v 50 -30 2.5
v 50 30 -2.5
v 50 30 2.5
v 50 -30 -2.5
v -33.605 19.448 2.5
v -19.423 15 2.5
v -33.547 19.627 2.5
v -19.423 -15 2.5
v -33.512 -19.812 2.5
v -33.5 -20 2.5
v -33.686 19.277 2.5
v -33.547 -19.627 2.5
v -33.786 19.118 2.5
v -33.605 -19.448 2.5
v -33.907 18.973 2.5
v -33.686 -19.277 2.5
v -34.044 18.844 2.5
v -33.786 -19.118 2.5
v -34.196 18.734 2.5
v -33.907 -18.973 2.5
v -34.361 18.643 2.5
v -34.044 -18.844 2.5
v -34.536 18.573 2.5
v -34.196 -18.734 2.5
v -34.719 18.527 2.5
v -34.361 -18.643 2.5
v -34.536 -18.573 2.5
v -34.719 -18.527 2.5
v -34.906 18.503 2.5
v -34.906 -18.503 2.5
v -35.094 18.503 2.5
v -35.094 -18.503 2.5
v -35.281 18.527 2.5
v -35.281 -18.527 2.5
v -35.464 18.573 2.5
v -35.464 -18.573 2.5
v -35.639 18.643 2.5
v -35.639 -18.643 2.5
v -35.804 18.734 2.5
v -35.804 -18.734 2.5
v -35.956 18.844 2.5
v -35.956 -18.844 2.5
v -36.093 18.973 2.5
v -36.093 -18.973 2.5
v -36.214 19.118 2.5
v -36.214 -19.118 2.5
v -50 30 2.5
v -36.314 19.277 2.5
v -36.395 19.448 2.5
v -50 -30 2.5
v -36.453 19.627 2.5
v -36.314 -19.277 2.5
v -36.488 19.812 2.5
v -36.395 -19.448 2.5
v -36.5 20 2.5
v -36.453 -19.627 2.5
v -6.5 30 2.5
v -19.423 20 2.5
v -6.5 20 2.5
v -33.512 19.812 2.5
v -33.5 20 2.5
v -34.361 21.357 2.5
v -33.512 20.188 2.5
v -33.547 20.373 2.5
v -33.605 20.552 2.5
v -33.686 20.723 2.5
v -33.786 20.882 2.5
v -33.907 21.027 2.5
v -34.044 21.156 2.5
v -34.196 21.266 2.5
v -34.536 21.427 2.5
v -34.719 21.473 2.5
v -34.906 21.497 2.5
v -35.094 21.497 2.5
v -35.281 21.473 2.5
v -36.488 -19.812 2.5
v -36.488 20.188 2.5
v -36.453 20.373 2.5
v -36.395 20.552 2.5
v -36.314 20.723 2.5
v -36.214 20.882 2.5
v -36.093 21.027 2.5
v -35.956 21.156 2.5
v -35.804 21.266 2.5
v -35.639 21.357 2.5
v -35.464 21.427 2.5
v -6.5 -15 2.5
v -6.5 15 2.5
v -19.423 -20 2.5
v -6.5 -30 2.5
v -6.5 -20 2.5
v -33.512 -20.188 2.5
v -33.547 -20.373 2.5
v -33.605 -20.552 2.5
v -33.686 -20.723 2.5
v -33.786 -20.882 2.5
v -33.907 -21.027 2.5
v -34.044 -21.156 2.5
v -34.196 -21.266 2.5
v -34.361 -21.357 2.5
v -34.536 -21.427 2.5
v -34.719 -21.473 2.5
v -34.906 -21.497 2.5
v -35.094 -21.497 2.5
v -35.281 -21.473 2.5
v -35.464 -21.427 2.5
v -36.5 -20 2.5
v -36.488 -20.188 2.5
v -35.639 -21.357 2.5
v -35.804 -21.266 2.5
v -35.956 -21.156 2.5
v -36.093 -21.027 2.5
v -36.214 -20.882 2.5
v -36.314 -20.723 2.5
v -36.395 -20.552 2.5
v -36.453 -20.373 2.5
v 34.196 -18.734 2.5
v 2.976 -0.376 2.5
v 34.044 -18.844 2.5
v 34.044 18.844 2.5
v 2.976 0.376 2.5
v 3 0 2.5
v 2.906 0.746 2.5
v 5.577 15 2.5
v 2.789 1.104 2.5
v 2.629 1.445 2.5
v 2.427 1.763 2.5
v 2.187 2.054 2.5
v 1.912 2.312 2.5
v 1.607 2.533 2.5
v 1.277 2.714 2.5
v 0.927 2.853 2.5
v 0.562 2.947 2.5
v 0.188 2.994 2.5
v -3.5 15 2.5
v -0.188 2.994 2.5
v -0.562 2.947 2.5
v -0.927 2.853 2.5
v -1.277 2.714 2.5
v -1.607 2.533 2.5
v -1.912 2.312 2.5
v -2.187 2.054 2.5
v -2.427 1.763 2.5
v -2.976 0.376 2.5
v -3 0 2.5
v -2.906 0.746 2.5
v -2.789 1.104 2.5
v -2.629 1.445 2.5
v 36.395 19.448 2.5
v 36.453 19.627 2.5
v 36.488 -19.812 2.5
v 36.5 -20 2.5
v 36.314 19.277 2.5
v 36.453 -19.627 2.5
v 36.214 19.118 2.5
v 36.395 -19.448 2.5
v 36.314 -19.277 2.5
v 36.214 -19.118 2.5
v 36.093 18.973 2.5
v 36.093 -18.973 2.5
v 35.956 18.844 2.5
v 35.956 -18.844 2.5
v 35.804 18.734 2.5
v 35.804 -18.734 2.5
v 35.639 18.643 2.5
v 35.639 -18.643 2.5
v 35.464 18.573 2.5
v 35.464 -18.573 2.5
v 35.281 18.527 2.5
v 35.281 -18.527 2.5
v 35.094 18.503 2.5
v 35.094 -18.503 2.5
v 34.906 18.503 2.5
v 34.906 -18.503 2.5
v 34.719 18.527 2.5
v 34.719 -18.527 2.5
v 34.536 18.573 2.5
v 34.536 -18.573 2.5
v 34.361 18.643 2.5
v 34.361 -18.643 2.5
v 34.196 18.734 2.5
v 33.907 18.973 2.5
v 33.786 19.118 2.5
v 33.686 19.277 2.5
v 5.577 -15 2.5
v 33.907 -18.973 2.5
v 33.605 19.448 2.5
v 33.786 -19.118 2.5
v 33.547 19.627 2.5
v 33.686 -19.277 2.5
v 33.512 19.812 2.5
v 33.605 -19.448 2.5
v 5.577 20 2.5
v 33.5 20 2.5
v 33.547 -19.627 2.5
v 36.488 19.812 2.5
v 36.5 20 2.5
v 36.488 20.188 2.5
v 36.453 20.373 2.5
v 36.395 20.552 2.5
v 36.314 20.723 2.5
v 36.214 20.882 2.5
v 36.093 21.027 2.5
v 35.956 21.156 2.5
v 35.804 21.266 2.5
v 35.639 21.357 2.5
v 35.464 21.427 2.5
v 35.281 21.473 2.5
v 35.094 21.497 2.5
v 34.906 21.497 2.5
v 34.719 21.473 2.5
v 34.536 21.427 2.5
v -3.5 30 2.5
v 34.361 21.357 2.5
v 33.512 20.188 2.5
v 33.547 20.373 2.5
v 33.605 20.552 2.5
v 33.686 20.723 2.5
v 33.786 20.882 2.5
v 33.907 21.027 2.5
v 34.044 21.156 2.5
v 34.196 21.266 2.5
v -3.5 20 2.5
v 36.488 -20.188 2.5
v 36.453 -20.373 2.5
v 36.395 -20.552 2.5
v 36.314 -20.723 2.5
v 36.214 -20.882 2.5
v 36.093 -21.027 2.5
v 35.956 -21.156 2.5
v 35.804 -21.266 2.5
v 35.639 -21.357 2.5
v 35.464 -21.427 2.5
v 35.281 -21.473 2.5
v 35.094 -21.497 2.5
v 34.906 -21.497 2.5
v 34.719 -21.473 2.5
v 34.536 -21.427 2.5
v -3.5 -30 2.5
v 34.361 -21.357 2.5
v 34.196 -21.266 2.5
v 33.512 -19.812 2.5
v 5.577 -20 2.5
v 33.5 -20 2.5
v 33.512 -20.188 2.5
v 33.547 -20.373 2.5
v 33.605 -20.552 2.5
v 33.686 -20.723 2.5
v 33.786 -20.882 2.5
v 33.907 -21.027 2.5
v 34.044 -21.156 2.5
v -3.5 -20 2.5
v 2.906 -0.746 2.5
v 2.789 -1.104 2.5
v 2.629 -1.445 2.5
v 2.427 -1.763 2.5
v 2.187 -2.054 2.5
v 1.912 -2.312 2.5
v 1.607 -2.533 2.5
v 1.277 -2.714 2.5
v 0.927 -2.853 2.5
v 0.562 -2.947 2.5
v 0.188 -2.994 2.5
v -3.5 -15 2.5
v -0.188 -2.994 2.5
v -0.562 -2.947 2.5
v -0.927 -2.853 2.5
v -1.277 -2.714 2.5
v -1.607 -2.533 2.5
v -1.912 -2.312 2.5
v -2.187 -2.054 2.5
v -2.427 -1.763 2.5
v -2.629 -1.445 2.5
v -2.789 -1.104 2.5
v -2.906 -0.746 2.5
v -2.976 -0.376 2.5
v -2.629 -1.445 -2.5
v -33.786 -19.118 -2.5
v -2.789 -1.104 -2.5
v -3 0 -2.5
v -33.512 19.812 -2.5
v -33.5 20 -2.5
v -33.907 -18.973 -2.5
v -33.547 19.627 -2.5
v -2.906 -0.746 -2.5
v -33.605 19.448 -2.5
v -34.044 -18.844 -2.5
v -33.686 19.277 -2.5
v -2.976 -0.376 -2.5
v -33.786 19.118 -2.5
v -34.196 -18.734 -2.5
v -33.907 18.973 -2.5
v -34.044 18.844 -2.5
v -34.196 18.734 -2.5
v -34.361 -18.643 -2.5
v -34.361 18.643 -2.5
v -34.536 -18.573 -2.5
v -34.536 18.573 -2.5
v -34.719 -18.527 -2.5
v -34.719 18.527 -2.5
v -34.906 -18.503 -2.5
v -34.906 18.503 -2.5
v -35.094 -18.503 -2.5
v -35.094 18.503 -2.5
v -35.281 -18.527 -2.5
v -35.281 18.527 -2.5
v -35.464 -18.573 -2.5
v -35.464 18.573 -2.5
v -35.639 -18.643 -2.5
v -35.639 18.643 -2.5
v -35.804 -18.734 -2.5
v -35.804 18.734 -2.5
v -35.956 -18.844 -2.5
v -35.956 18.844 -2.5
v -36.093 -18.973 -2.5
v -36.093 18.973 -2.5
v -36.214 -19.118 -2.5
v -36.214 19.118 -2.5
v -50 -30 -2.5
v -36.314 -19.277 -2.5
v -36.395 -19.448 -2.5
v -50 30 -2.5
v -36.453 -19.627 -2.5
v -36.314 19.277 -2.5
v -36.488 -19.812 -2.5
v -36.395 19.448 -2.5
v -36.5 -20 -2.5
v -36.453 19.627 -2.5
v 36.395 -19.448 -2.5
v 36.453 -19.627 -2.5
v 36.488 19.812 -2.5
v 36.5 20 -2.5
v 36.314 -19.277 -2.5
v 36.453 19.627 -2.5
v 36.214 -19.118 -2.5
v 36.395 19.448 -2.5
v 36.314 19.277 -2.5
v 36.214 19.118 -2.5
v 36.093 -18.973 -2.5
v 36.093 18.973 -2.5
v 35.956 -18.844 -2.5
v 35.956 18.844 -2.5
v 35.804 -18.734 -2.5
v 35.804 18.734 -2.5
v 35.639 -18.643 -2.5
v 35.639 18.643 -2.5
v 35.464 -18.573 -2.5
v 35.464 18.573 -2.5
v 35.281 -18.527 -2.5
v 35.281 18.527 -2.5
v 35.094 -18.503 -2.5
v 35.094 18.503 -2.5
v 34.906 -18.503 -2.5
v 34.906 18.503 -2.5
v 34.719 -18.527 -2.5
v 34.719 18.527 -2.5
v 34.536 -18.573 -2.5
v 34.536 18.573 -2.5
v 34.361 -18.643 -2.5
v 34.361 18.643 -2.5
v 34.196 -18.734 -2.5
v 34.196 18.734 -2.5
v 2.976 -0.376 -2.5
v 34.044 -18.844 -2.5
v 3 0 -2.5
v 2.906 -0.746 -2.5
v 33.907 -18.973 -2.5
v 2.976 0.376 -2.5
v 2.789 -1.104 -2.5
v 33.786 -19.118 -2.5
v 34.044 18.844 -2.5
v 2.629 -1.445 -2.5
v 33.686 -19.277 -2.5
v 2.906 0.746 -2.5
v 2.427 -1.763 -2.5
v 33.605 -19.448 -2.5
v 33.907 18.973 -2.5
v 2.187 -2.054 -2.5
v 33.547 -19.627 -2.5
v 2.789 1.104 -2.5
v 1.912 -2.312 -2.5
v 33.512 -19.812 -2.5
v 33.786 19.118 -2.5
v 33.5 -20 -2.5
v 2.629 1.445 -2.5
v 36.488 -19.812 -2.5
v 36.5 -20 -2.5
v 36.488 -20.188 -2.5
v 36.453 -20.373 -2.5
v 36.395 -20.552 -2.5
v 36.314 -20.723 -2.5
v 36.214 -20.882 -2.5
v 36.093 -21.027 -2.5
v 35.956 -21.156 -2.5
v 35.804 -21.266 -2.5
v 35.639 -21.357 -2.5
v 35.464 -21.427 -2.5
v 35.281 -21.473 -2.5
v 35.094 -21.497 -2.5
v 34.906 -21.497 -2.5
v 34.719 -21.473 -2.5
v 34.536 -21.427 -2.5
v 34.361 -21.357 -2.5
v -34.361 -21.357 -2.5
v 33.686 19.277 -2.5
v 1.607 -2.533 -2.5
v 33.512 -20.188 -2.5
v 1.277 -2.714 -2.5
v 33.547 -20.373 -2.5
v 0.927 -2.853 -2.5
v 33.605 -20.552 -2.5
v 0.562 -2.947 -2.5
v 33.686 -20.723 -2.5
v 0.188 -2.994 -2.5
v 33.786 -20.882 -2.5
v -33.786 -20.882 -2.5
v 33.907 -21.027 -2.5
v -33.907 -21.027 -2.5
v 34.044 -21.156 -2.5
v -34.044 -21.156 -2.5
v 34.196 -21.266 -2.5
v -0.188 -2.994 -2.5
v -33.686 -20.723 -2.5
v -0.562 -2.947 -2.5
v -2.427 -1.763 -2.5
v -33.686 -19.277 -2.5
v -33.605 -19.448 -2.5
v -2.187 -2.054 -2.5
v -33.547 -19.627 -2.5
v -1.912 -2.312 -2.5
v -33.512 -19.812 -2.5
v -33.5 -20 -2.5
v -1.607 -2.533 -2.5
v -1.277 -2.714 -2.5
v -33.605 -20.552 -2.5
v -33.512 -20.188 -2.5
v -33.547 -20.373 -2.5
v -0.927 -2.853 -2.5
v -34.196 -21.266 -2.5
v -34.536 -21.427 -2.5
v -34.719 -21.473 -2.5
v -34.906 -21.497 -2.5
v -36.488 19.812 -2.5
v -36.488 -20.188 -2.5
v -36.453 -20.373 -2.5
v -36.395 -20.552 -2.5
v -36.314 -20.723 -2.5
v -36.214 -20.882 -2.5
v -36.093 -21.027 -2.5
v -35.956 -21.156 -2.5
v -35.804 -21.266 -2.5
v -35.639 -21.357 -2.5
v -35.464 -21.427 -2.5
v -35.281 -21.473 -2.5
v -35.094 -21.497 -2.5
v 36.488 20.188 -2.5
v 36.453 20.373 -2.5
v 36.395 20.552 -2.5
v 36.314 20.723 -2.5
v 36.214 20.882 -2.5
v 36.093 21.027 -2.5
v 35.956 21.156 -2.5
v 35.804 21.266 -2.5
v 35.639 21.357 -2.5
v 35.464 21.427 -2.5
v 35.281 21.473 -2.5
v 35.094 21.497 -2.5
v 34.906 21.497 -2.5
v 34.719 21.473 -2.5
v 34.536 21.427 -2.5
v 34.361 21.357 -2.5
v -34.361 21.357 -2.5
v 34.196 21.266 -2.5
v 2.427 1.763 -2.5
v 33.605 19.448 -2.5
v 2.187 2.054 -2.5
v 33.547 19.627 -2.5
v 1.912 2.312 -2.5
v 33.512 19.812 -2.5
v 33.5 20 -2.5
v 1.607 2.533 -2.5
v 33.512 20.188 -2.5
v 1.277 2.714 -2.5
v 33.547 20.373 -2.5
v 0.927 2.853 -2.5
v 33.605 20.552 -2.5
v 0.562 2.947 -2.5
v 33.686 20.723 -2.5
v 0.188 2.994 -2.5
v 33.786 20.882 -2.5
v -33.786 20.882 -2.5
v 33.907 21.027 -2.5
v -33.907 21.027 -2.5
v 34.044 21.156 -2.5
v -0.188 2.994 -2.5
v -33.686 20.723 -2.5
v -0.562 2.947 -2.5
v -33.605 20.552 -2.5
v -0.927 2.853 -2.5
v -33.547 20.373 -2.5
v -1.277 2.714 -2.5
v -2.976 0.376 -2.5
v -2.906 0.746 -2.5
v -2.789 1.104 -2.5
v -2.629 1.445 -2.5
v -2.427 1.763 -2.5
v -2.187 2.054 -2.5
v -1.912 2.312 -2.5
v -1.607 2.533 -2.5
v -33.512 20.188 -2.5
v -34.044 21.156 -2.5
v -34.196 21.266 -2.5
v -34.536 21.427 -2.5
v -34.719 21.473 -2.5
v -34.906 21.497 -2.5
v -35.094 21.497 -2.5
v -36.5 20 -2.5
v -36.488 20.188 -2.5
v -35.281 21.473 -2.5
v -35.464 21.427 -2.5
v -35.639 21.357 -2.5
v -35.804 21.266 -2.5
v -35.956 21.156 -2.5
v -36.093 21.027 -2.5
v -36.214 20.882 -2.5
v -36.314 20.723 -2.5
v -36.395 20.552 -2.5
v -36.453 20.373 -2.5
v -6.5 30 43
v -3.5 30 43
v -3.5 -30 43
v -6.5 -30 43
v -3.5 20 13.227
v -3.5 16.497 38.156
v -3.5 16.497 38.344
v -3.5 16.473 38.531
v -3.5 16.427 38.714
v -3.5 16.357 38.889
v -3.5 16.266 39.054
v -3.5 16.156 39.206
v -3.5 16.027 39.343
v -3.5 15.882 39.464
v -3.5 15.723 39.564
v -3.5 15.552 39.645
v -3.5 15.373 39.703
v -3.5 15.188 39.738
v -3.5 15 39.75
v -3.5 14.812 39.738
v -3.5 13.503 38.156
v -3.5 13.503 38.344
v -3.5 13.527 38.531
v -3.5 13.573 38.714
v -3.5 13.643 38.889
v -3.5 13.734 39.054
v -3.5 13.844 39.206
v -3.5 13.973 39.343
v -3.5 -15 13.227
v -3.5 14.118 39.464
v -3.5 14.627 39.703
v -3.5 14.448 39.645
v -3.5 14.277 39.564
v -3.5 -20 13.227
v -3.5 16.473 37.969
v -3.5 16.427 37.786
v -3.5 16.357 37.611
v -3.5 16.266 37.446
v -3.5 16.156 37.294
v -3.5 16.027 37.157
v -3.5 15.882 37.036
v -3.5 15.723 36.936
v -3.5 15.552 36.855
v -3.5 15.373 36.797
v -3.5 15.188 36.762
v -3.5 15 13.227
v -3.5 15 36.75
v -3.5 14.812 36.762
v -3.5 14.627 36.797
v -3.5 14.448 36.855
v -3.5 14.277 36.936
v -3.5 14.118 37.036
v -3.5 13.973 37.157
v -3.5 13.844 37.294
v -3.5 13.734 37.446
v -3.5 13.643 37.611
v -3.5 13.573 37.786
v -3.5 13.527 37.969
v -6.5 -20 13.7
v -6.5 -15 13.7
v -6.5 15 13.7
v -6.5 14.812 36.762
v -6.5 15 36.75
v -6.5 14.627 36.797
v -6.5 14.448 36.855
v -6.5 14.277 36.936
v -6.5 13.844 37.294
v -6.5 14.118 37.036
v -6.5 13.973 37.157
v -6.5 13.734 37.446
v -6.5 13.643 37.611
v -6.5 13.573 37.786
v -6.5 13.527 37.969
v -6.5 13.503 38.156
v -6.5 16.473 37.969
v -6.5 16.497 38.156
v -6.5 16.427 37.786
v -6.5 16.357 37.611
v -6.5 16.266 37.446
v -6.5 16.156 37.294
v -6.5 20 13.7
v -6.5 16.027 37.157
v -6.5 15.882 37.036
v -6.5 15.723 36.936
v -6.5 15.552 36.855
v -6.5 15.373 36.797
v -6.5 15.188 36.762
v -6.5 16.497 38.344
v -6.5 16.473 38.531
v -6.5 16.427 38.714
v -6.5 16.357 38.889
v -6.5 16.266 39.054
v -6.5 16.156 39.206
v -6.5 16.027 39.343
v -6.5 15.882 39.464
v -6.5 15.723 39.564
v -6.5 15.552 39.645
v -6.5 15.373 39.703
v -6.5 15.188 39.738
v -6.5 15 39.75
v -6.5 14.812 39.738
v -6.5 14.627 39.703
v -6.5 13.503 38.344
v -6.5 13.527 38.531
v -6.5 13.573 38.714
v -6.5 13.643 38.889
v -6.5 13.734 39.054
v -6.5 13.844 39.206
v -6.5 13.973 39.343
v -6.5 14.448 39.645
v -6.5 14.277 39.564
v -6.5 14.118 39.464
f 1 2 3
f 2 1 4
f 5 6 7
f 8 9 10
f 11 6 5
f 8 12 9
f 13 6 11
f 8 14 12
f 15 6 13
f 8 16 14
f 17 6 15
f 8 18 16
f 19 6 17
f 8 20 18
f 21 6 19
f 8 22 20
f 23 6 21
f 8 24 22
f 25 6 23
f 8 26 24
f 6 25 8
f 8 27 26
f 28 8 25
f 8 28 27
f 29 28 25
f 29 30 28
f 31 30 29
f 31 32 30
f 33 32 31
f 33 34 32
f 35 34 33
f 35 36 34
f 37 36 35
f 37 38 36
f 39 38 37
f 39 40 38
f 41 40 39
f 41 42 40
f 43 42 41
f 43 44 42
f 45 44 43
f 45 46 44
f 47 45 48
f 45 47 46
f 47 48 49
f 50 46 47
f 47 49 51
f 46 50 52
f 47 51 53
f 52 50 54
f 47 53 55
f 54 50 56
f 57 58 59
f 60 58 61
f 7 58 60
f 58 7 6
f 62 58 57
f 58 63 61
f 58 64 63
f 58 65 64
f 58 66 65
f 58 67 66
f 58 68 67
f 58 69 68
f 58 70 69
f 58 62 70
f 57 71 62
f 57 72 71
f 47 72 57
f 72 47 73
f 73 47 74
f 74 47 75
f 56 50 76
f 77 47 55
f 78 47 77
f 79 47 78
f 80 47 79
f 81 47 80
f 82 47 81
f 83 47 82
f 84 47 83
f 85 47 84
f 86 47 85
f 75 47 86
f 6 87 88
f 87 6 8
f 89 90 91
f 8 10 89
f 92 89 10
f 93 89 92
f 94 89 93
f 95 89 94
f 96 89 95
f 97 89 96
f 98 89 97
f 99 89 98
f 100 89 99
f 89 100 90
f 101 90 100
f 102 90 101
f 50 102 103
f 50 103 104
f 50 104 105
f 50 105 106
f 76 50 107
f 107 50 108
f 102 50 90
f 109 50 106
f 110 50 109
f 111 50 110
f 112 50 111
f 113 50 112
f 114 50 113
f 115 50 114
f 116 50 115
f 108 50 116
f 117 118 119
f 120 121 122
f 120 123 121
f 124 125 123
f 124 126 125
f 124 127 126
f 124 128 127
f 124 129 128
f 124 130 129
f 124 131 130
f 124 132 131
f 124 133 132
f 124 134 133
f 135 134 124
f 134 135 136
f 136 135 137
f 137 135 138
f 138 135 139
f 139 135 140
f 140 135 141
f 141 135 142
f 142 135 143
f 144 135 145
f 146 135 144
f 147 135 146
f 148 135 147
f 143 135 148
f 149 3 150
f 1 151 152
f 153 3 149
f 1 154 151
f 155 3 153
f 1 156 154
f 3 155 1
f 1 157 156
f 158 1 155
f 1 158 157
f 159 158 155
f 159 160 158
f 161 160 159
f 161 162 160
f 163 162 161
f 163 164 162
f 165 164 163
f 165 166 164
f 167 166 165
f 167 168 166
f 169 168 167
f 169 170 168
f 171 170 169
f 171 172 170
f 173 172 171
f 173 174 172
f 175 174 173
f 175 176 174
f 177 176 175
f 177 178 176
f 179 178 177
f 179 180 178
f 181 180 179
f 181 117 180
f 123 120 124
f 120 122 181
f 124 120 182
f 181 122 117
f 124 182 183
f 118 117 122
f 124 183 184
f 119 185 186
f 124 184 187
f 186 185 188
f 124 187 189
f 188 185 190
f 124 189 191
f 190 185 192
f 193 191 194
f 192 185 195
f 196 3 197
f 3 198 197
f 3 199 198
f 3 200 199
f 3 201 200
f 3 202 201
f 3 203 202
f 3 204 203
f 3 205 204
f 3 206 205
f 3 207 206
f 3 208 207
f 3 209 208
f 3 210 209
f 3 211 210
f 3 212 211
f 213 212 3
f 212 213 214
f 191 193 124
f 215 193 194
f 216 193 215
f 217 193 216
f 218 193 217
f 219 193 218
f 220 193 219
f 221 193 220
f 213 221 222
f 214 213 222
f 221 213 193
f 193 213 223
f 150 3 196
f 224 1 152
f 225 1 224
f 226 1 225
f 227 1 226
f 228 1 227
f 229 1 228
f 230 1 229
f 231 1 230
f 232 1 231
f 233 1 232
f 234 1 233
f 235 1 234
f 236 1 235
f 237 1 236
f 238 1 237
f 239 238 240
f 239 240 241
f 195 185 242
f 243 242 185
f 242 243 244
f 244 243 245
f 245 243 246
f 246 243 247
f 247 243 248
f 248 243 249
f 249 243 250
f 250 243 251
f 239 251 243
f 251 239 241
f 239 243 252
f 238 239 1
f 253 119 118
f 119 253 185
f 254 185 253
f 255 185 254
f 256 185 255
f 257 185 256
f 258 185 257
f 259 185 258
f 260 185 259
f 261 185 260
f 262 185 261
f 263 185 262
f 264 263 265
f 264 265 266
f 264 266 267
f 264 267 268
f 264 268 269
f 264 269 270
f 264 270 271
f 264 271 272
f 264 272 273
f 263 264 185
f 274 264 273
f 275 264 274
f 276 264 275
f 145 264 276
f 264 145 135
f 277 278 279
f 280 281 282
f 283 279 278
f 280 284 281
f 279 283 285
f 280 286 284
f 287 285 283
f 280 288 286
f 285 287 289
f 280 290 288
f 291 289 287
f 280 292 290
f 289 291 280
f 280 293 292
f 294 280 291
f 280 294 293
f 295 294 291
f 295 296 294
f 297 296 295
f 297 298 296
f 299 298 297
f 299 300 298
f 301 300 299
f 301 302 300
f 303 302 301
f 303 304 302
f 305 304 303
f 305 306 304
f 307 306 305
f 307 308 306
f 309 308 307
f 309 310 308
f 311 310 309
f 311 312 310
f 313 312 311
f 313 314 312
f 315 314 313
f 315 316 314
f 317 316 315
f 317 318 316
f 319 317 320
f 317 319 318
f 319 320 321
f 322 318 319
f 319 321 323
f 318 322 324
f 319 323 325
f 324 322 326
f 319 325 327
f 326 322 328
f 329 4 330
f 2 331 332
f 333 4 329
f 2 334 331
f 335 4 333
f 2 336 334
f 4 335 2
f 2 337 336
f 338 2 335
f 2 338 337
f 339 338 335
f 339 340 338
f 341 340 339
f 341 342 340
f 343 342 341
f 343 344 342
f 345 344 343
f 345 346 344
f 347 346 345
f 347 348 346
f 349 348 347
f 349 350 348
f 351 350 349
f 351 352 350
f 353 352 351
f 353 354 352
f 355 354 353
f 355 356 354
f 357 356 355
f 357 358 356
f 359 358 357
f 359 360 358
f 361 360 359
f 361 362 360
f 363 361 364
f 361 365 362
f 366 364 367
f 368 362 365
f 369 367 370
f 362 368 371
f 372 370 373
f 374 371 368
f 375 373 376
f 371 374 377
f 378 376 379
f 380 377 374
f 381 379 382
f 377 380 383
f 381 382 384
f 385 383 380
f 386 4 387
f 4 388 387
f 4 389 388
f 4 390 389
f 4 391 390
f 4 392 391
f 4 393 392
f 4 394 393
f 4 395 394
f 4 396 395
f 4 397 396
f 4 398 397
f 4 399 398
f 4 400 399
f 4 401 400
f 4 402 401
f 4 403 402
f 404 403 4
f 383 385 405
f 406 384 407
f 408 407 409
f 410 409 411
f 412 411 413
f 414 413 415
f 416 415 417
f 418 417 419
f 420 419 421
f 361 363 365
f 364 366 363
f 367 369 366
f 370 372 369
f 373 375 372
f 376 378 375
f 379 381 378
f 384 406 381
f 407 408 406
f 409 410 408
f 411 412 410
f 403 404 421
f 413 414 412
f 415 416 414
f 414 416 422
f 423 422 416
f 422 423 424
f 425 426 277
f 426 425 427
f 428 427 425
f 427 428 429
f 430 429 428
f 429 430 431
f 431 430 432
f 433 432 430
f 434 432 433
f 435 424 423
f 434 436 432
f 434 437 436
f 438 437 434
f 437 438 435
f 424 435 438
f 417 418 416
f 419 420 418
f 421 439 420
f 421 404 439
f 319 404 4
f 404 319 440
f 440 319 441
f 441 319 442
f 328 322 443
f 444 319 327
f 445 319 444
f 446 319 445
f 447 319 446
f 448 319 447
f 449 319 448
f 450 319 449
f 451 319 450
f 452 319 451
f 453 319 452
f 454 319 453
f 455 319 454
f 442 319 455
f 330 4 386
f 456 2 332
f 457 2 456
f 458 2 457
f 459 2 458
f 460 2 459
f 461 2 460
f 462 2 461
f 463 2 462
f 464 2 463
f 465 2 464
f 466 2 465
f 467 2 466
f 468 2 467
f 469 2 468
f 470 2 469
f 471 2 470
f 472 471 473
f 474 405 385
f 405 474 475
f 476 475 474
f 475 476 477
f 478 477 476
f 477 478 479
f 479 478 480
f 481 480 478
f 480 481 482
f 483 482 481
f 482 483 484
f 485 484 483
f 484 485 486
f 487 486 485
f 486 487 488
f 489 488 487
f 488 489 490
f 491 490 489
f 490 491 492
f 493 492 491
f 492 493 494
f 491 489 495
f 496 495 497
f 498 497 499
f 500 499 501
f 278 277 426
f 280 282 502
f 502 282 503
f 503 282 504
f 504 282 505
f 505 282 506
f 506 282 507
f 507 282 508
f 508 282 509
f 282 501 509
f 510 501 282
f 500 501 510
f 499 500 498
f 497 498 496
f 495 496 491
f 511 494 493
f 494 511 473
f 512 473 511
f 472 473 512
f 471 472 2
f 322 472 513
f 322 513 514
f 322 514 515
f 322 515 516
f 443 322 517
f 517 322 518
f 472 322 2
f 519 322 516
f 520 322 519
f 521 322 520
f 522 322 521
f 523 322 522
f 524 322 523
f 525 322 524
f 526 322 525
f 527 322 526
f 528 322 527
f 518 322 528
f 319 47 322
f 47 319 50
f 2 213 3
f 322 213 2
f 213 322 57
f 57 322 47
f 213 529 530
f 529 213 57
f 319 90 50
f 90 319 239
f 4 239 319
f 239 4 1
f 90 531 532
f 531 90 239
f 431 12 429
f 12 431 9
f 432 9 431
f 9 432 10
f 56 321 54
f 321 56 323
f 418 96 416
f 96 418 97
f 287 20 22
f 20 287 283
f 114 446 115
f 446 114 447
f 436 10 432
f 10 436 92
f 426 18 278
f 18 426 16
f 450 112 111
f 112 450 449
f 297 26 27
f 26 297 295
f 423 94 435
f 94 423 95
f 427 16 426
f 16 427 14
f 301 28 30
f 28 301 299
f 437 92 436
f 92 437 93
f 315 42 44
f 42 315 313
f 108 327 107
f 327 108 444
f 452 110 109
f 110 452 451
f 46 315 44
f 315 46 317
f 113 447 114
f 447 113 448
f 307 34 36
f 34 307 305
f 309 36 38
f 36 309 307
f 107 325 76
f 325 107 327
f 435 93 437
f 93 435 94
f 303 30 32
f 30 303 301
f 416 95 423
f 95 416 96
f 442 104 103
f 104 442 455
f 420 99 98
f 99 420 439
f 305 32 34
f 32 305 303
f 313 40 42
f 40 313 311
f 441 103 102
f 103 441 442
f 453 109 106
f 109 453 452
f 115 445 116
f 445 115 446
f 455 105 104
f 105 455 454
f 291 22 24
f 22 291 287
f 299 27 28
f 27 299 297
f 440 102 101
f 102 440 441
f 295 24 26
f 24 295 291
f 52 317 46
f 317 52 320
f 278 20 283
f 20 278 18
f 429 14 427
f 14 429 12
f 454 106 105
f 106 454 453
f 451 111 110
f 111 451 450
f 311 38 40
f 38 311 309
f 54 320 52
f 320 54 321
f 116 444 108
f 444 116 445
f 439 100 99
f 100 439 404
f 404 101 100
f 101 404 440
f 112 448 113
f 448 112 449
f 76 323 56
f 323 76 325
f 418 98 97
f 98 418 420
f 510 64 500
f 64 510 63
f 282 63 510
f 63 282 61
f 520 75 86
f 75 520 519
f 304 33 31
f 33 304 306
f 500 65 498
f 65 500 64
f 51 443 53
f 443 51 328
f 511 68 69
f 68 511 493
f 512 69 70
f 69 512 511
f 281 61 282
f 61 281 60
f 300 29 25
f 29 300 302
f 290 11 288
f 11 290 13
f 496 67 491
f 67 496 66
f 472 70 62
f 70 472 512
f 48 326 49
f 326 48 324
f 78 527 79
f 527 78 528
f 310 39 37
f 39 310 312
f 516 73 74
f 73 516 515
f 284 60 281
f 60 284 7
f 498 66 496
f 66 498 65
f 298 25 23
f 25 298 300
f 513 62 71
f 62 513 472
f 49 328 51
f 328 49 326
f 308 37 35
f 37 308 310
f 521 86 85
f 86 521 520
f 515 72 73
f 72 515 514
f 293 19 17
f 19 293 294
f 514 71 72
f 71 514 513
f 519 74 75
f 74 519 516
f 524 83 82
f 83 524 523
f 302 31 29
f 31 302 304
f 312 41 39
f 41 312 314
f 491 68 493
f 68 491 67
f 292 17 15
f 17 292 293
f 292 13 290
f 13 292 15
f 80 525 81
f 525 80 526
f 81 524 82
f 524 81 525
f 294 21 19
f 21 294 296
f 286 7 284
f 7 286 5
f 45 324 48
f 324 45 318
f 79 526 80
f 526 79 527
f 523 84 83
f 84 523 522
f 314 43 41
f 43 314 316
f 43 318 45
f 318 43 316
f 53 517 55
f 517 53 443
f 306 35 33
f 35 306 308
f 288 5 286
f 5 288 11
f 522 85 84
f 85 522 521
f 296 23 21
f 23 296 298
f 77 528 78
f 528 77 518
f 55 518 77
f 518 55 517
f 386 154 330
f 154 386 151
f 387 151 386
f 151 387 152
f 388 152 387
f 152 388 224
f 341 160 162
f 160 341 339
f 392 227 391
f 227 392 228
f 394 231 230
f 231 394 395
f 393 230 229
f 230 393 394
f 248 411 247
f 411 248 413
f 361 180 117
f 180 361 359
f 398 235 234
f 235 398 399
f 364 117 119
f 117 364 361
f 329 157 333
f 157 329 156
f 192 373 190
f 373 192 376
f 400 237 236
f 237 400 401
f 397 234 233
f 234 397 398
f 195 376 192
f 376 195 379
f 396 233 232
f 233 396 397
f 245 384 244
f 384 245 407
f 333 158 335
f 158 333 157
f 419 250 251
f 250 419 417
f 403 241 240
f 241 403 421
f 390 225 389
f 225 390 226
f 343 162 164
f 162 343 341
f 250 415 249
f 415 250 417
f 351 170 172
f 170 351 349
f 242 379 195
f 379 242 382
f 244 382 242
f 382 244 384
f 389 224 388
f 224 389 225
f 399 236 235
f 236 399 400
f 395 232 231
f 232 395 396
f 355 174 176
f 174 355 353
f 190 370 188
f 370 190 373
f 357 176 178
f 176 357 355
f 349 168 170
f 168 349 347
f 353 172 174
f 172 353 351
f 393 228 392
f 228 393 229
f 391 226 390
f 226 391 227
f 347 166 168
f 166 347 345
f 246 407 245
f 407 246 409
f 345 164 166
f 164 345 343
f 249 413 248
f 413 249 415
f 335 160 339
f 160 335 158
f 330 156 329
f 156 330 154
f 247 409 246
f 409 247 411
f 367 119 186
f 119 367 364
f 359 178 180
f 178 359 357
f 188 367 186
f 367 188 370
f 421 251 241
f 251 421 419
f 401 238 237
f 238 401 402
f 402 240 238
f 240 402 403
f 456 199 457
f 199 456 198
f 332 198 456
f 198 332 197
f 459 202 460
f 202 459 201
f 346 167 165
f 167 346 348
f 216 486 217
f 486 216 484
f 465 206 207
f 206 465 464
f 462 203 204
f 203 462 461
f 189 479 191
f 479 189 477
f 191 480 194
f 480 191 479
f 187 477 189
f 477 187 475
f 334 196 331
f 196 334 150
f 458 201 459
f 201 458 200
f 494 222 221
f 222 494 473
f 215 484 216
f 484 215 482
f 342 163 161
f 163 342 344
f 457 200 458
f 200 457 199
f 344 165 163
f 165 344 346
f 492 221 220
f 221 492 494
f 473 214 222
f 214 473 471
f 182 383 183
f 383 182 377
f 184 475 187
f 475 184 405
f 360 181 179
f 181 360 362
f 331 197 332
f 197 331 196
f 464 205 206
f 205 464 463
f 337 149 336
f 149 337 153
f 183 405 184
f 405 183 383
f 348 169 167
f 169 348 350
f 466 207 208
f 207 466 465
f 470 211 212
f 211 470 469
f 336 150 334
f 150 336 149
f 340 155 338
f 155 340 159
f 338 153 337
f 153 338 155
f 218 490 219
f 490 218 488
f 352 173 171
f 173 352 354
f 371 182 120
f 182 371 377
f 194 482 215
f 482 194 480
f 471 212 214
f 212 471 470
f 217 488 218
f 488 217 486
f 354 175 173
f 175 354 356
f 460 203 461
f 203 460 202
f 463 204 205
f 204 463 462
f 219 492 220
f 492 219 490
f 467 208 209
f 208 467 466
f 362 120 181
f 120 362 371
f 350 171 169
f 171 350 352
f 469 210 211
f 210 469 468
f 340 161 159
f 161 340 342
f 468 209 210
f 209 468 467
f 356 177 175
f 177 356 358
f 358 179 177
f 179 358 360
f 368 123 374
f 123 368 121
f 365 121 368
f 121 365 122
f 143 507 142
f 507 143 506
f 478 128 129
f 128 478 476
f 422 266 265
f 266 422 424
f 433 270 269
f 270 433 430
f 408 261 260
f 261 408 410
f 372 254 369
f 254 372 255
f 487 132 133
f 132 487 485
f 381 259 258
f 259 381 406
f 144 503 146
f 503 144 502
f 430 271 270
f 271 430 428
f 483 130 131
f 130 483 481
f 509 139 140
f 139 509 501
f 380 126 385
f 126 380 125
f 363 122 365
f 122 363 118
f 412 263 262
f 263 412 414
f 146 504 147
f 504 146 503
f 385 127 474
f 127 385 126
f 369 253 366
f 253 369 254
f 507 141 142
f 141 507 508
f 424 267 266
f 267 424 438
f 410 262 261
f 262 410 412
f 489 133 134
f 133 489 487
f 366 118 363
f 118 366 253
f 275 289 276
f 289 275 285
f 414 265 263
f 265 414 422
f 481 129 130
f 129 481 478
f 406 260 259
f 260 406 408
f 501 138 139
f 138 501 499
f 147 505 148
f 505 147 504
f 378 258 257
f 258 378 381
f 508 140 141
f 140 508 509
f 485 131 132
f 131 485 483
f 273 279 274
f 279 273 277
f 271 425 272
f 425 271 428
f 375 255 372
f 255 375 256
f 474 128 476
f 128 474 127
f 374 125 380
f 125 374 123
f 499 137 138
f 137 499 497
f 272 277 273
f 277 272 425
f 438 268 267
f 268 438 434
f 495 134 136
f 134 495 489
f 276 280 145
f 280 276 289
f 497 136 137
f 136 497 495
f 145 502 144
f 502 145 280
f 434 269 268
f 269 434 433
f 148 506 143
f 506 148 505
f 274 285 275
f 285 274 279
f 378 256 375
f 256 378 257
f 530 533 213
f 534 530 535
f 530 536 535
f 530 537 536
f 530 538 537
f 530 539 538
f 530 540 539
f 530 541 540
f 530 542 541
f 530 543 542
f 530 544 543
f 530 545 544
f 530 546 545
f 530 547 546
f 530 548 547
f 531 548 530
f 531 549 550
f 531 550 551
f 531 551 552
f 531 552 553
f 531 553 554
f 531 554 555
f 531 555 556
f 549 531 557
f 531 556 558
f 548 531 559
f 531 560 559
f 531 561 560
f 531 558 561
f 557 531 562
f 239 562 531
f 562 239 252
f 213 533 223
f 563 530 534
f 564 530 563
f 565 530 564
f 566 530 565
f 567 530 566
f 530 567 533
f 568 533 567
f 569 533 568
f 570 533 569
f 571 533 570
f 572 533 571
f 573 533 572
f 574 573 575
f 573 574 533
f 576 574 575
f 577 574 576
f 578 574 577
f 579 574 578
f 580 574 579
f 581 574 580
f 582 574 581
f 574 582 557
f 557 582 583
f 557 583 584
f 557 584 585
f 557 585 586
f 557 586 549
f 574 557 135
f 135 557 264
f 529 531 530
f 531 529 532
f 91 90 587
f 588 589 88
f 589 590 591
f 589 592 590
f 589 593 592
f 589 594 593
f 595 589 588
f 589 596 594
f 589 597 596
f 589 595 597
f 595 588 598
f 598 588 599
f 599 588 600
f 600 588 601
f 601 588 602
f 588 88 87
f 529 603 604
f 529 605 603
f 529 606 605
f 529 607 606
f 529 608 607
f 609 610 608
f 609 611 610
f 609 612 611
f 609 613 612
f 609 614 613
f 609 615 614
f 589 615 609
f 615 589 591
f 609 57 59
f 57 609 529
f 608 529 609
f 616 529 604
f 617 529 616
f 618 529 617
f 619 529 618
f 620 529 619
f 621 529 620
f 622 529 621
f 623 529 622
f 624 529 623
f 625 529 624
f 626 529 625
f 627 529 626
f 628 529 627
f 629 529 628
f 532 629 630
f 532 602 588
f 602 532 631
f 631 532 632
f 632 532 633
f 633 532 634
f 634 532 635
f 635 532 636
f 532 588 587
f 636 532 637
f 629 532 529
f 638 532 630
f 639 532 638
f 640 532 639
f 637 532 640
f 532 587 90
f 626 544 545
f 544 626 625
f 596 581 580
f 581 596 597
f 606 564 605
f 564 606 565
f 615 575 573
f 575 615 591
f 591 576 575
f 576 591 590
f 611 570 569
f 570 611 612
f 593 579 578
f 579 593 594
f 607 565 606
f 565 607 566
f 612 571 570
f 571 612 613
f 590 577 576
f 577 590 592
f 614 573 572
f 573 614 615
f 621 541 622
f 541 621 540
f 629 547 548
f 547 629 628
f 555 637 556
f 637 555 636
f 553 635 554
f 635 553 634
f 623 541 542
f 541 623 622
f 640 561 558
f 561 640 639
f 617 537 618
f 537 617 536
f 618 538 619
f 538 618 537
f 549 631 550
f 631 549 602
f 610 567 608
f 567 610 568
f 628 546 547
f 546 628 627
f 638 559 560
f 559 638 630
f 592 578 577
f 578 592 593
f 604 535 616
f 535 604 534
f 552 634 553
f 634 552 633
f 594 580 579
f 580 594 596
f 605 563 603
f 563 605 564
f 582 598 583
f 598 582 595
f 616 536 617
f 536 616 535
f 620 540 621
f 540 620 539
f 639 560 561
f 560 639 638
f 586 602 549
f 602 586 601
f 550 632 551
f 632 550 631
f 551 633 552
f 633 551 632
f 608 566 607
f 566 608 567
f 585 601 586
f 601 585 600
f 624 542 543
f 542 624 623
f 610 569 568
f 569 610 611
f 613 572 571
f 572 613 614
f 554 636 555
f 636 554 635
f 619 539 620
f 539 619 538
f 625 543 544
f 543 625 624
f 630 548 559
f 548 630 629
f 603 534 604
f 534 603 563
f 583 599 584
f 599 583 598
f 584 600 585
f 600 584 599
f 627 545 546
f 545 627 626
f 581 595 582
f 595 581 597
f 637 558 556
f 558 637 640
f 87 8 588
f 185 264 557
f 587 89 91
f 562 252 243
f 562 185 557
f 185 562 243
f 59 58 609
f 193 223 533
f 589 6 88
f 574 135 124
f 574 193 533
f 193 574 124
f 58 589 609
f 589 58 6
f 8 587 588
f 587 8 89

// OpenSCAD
//Author: Piotr Paterek, Kraków 05-08.2016
$fn=50;
difference()
{
    difference()
    {
        difference()
    {
        difference()
    {
    difference()
    {
        cube([100,60,5], center=true);
        translate([-35,-20,-3])
        {
            cylinder(r=1.5,h=6);
        }
    }
        translate([-35,20,-3])
        {
            cylinder(r=1.5,h=6);
        }
    }
    translate([35,-20,-3])
        {
            cylinder(r=1.5,h=6);
        }
    }
    translate([35,20,-3])
        {
            cylinder(r=1.5,h=6);
        }
    }
    //screw hole
    translate([0,0,-5])
        {
            cylinder(r=3,h=10);
        }
}
difference()
{
    translate([-5,0,21.5])
    {
        cube([3,60,43], center=true);
    }
    translate([-5,15,38.25])
    {
        rotate(a=90, v=[0,1,0])
        {
        cylinder(r=1.5, h=3, center=true);
        }
    }
}
translate([0,-15,0])
{
    
rotate(a=90,v=[1,0,0])
{
    linear_extrude(height=5, convexity = 10){
    polygon(points=[[-5,15],[6,2],[-5,2]]);
    }
}
}
translate([0,20,0])
{
    
rotate(a=90,v=[1,0,0])
{
    linear_extrude(height=5, convexity = 10){
    polygon(points=[[-5,15],[6,2],[-5,2]]);
    }
}
}
translate([0,20,0])
{
    
rotate(a=90,v=[1,0,0])
{
    linear_extrude(height=5, convexity = 10){
    polygon(points=[[-5,15],[-20,2],[-5,2]]);
    }
}
}
translate([0,-15,0])
{
    
rotate(a=90,v=[1,0,0])
{
    linear_extrude(height=5, convexity = 10){
    polygon(points=[[-5,15],[-20,2],[-5,2]]);
    }
}
}
